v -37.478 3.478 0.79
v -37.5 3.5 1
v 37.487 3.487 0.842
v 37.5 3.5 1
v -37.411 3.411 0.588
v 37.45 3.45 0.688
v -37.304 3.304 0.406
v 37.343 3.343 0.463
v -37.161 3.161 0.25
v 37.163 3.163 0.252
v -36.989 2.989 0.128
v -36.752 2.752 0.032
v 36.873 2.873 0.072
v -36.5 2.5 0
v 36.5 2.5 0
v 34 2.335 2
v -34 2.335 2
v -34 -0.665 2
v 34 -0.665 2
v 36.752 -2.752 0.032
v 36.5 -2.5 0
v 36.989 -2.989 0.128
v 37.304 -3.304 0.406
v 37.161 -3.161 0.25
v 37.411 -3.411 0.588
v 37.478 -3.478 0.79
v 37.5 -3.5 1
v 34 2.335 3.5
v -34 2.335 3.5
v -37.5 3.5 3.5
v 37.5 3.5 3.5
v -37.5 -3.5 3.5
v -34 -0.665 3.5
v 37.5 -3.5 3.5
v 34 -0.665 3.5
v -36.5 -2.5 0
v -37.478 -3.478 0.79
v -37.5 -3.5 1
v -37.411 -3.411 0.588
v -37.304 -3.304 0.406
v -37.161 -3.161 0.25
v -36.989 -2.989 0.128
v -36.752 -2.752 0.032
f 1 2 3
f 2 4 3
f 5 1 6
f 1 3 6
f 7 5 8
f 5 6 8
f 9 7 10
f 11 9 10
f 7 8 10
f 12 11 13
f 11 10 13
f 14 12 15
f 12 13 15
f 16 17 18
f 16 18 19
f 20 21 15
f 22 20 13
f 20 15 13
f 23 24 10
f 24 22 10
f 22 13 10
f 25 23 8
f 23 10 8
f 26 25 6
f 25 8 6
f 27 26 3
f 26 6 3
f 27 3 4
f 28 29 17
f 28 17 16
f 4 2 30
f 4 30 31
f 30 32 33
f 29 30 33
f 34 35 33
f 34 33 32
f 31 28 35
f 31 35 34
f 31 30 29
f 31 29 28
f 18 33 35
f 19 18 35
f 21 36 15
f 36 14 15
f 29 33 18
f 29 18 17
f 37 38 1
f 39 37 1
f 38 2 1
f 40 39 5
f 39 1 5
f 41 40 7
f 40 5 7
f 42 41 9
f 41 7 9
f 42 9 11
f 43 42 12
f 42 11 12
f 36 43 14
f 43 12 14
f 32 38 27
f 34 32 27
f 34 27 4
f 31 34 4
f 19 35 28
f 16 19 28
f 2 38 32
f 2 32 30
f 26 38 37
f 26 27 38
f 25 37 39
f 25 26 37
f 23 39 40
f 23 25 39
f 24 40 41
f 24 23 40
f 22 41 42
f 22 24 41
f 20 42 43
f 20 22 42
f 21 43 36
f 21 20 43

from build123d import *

# Parameters (mm, degrees)
F0_W     = 75
F0_H     = 7
F1_DEPTH = 3.5
F2_W     = 68
F2_H     = 3
F3_DEPTH = 1.5
F4_R     = 1


with BuildPart() as f1:
    # F0 (on Top) → F1 (new body)
    with BuildSketch(Plane.XY):
        Rectangle(F0_W, F0_H)
    extrude(amount=F1_DEPTH)

    # F2 (on face) → F3 (cut)
    with BuildSketch(Plane.XY.offset(3.5)):
        with Locations((0, 0.834541)):
            Rectangle(F2_W, F2_H)
    extrude(amount=-F3_DEPTH, mode=Mode.SUBTRACT)

    # F4
    f4_edges = [f1.edges().sort_by_distance(p)[0] for p in [
        (0, -3.5, 0),
        (37.5, 0, 0),
        (0, 3.5, 0),
        (-37.5, 0, 0),
    ]]
    fillet(f4_edges, radius=F4_R)


solid = f1.part
